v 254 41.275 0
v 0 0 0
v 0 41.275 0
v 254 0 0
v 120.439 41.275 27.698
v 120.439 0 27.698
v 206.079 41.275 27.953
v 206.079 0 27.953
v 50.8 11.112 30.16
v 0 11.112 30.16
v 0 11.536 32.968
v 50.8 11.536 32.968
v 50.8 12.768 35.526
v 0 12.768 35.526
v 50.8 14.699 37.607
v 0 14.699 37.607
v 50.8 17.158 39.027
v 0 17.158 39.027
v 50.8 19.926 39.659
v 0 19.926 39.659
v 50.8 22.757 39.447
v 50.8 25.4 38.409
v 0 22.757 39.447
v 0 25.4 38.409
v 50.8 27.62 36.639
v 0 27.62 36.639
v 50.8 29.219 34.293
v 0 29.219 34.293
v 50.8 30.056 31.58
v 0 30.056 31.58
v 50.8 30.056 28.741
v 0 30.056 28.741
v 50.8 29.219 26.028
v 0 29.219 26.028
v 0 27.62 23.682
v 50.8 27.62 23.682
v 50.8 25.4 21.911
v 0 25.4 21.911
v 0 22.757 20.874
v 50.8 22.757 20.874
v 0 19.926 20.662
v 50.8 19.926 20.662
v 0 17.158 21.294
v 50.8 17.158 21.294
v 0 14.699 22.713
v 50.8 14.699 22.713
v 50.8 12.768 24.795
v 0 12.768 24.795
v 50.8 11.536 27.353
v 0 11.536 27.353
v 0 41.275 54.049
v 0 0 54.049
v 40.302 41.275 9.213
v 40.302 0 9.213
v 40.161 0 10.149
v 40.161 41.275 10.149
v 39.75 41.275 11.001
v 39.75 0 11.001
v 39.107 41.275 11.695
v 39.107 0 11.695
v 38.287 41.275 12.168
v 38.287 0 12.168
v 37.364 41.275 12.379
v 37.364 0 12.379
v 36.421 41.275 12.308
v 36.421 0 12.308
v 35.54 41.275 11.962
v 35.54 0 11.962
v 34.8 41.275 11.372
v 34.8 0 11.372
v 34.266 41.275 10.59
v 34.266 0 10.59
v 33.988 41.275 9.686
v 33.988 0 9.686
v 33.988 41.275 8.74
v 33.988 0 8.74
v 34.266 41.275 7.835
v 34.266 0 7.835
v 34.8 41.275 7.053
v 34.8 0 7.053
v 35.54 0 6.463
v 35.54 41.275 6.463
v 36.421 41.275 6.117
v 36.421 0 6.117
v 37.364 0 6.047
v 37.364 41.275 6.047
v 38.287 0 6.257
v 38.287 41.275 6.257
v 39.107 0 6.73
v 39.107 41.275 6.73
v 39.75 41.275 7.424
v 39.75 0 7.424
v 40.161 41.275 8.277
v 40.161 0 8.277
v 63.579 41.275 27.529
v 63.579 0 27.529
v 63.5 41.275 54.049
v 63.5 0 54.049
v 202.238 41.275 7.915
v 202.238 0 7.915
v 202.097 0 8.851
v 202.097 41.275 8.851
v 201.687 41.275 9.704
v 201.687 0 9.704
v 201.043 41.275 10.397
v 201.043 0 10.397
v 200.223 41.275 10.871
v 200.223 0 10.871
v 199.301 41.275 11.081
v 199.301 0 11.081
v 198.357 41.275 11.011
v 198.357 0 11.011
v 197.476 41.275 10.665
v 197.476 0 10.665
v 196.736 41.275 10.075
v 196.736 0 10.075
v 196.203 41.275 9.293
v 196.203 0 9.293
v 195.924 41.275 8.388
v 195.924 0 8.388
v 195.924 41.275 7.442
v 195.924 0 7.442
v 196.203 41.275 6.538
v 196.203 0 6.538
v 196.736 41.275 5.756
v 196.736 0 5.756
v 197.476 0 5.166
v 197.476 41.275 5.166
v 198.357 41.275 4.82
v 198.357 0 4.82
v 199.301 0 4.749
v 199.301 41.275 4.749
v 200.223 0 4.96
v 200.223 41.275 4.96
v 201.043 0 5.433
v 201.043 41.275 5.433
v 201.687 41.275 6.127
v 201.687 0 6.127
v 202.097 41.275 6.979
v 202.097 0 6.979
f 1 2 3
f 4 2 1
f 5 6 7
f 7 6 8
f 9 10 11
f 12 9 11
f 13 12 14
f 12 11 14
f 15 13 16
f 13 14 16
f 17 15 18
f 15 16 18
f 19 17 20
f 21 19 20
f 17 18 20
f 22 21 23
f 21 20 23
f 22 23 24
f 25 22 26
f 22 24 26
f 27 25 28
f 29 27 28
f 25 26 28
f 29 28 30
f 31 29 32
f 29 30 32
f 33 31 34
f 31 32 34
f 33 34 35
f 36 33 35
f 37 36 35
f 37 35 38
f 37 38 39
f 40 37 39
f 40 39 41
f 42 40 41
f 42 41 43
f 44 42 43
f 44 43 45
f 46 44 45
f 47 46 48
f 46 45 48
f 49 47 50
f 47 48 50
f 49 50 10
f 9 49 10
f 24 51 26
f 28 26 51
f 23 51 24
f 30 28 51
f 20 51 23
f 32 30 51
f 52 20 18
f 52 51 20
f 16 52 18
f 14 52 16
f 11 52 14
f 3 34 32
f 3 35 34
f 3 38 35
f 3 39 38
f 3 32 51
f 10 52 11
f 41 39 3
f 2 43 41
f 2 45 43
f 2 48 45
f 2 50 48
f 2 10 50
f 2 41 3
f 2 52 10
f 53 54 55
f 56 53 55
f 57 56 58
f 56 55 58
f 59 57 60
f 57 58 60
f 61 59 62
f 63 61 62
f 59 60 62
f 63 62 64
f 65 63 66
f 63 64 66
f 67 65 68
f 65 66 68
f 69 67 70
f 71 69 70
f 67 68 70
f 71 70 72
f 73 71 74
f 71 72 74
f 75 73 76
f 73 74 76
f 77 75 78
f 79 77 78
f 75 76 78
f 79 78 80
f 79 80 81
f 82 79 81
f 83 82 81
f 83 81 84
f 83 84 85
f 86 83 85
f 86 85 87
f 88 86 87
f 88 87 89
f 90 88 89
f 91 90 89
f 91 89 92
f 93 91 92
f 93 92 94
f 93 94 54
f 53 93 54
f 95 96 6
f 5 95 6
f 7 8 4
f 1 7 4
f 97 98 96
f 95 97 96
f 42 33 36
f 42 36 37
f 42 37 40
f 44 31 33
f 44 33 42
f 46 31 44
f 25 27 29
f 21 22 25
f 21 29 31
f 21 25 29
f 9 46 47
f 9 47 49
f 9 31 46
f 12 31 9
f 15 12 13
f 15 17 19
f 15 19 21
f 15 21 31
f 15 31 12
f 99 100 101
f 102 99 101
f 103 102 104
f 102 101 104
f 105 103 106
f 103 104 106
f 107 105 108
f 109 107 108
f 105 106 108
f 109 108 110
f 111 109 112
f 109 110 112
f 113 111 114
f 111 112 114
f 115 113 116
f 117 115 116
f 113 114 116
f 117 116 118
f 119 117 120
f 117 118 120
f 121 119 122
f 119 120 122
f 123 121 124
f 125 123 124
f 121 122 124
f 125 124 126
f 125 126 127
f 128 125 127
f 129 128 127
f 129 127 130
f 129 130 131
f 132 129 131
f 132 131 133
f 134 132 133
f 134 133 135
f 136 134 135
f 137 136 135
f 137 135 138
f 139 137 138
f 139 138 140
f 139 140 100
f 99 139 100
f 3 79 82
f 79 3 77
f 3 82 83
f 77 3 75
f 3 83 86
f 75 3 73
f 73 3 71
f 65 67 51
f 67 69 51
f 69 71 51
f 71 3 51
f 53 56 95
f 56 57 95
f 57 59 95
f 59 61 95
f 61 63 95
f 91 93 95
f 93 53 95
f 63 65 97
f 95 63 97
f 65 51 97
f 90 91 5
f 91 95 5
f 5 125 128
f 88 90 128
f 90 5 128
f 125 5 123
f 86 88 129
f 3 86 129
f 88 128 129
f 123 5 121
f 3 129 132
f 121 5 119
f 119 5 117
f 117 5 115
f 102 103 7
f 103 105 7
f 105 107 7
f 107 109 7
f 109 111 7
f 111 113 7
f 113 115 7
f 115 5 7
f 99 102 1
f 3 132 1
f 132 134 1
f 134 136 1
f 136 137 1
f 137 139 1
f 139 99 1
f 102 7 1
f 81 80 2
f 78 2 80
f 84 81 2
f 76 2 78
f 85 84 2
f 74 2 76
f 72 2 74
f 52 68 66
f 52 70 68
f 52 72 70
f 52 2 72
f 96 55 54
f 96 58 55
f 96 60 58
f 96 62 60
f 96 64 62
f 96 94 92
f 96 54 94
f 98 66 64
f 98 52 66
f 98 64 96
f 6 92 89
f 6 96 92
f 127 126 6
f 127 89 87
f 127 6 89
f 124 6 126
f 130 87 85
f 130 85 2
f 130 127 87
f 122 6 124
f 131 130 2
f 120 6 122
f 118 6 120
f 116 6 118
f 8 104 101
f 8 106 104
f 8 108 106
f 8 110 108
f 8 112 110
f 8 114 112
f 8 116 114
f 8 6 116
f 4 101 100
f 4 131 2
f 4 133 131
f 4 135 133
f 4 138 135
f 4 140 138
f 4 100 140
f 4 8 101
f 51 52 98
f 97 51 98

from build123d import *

# Parameters (mm, degrees)
F1_DEPTH  = 41.275
F2_R      = 9.525
F3_DEPTH  = 50.8
F5_DEPTH  = 50.8
F7_DEPTH  = 50.8
F9_DEPTH  = 50.8
F10_R     = 3.175
F10_R_2   = 3.361139
F11_DEPTH = 228.6
F12_DEPTH = 228.6


with BuildPart() as f1:
    # F0 (on Front) → F1 (new body)
    with BuildSketch(Plane.XZ):
        Polygon((304.8, 19.05), (0, 73.025), (0, 0), (304.8, 0), align=None)
    extrude(amount=-F1_DEPTH)

    # F2 (on face) → F3 (cut)
    with BuildSketch(Plane(origin=(0, 0, 0), x_dir=(0, -1, 0), z_dir=(-1, 0, 0))):
        with Locations((-20.6375, 30.160377)):
            Circle(F2_R)
    extrude(amount=-F3_DEPTH, mode=Mode.SUBTRACT)

    # F4 (on face) → F5 (cut)
    with BuildSketch(Plane.XZ):
        Polygon((0, 73.025), (0, 54.048669), (107.16046, 54.048669), align=None)
        Polygon((253.724616, 28.094599), (107.16046, 54.048669), (120.438509, 27.69807), align=None)
        Polygon((304.8, 19.05), (253.724616, 28.094599), (304.8, 0), align=None)
    extrude(amount=-F5_DEPTH, mode=Mode.SUBTRACT)

    # F6 (on face) → F7 (cut)
    with BuildSketch(Plane.XZ):
        Polygon((63.578897, 27.528911), (120.438509, 27.69807), (107.16046, 54.048669), (63.5, 54.048669), align=None)
    extrude(amount=-F7_DEPTH, mode=Mode.SUBTRACT)

    # F8 (on face) → F9 (cut)
    with BuildSketch(Plane.XZ):
        Polygon((254, 0), (304.8, 0), (253.724616, 28.094599), (206.078957, 27.952852), align=None)
    extrude(amount=-F9_DEPTH, mode=Mode.SUBTRACT)

    # F10 (on face) → F11 (cut)
    with BuildSketch(Plane.XZ):
        with Locations((37.127063, 9.212729)):
            Circle(F10_R)
        with Locations((289.942942, 6.520301)):
            Circle(F10_R_2)
    extrude(amount=-F11_DEPTH, mode=Mode.SUBTRACT)

    # F10 (on face) → F12 (cut)
    with BuildSketch(Plane.XZ):
        with Locations((37.127063, 9.212729)):
            Circle(F10_R)
        with Locations((289.942942, 6.520301)):
            Circle(F10_R_2)
        with Locations((199.063465, 7.915162)):
            Circle(F10_R)
    extrude(amount=-F12_DEPTH, mode=Mode.SUBTRACT)


solid = f1.part
